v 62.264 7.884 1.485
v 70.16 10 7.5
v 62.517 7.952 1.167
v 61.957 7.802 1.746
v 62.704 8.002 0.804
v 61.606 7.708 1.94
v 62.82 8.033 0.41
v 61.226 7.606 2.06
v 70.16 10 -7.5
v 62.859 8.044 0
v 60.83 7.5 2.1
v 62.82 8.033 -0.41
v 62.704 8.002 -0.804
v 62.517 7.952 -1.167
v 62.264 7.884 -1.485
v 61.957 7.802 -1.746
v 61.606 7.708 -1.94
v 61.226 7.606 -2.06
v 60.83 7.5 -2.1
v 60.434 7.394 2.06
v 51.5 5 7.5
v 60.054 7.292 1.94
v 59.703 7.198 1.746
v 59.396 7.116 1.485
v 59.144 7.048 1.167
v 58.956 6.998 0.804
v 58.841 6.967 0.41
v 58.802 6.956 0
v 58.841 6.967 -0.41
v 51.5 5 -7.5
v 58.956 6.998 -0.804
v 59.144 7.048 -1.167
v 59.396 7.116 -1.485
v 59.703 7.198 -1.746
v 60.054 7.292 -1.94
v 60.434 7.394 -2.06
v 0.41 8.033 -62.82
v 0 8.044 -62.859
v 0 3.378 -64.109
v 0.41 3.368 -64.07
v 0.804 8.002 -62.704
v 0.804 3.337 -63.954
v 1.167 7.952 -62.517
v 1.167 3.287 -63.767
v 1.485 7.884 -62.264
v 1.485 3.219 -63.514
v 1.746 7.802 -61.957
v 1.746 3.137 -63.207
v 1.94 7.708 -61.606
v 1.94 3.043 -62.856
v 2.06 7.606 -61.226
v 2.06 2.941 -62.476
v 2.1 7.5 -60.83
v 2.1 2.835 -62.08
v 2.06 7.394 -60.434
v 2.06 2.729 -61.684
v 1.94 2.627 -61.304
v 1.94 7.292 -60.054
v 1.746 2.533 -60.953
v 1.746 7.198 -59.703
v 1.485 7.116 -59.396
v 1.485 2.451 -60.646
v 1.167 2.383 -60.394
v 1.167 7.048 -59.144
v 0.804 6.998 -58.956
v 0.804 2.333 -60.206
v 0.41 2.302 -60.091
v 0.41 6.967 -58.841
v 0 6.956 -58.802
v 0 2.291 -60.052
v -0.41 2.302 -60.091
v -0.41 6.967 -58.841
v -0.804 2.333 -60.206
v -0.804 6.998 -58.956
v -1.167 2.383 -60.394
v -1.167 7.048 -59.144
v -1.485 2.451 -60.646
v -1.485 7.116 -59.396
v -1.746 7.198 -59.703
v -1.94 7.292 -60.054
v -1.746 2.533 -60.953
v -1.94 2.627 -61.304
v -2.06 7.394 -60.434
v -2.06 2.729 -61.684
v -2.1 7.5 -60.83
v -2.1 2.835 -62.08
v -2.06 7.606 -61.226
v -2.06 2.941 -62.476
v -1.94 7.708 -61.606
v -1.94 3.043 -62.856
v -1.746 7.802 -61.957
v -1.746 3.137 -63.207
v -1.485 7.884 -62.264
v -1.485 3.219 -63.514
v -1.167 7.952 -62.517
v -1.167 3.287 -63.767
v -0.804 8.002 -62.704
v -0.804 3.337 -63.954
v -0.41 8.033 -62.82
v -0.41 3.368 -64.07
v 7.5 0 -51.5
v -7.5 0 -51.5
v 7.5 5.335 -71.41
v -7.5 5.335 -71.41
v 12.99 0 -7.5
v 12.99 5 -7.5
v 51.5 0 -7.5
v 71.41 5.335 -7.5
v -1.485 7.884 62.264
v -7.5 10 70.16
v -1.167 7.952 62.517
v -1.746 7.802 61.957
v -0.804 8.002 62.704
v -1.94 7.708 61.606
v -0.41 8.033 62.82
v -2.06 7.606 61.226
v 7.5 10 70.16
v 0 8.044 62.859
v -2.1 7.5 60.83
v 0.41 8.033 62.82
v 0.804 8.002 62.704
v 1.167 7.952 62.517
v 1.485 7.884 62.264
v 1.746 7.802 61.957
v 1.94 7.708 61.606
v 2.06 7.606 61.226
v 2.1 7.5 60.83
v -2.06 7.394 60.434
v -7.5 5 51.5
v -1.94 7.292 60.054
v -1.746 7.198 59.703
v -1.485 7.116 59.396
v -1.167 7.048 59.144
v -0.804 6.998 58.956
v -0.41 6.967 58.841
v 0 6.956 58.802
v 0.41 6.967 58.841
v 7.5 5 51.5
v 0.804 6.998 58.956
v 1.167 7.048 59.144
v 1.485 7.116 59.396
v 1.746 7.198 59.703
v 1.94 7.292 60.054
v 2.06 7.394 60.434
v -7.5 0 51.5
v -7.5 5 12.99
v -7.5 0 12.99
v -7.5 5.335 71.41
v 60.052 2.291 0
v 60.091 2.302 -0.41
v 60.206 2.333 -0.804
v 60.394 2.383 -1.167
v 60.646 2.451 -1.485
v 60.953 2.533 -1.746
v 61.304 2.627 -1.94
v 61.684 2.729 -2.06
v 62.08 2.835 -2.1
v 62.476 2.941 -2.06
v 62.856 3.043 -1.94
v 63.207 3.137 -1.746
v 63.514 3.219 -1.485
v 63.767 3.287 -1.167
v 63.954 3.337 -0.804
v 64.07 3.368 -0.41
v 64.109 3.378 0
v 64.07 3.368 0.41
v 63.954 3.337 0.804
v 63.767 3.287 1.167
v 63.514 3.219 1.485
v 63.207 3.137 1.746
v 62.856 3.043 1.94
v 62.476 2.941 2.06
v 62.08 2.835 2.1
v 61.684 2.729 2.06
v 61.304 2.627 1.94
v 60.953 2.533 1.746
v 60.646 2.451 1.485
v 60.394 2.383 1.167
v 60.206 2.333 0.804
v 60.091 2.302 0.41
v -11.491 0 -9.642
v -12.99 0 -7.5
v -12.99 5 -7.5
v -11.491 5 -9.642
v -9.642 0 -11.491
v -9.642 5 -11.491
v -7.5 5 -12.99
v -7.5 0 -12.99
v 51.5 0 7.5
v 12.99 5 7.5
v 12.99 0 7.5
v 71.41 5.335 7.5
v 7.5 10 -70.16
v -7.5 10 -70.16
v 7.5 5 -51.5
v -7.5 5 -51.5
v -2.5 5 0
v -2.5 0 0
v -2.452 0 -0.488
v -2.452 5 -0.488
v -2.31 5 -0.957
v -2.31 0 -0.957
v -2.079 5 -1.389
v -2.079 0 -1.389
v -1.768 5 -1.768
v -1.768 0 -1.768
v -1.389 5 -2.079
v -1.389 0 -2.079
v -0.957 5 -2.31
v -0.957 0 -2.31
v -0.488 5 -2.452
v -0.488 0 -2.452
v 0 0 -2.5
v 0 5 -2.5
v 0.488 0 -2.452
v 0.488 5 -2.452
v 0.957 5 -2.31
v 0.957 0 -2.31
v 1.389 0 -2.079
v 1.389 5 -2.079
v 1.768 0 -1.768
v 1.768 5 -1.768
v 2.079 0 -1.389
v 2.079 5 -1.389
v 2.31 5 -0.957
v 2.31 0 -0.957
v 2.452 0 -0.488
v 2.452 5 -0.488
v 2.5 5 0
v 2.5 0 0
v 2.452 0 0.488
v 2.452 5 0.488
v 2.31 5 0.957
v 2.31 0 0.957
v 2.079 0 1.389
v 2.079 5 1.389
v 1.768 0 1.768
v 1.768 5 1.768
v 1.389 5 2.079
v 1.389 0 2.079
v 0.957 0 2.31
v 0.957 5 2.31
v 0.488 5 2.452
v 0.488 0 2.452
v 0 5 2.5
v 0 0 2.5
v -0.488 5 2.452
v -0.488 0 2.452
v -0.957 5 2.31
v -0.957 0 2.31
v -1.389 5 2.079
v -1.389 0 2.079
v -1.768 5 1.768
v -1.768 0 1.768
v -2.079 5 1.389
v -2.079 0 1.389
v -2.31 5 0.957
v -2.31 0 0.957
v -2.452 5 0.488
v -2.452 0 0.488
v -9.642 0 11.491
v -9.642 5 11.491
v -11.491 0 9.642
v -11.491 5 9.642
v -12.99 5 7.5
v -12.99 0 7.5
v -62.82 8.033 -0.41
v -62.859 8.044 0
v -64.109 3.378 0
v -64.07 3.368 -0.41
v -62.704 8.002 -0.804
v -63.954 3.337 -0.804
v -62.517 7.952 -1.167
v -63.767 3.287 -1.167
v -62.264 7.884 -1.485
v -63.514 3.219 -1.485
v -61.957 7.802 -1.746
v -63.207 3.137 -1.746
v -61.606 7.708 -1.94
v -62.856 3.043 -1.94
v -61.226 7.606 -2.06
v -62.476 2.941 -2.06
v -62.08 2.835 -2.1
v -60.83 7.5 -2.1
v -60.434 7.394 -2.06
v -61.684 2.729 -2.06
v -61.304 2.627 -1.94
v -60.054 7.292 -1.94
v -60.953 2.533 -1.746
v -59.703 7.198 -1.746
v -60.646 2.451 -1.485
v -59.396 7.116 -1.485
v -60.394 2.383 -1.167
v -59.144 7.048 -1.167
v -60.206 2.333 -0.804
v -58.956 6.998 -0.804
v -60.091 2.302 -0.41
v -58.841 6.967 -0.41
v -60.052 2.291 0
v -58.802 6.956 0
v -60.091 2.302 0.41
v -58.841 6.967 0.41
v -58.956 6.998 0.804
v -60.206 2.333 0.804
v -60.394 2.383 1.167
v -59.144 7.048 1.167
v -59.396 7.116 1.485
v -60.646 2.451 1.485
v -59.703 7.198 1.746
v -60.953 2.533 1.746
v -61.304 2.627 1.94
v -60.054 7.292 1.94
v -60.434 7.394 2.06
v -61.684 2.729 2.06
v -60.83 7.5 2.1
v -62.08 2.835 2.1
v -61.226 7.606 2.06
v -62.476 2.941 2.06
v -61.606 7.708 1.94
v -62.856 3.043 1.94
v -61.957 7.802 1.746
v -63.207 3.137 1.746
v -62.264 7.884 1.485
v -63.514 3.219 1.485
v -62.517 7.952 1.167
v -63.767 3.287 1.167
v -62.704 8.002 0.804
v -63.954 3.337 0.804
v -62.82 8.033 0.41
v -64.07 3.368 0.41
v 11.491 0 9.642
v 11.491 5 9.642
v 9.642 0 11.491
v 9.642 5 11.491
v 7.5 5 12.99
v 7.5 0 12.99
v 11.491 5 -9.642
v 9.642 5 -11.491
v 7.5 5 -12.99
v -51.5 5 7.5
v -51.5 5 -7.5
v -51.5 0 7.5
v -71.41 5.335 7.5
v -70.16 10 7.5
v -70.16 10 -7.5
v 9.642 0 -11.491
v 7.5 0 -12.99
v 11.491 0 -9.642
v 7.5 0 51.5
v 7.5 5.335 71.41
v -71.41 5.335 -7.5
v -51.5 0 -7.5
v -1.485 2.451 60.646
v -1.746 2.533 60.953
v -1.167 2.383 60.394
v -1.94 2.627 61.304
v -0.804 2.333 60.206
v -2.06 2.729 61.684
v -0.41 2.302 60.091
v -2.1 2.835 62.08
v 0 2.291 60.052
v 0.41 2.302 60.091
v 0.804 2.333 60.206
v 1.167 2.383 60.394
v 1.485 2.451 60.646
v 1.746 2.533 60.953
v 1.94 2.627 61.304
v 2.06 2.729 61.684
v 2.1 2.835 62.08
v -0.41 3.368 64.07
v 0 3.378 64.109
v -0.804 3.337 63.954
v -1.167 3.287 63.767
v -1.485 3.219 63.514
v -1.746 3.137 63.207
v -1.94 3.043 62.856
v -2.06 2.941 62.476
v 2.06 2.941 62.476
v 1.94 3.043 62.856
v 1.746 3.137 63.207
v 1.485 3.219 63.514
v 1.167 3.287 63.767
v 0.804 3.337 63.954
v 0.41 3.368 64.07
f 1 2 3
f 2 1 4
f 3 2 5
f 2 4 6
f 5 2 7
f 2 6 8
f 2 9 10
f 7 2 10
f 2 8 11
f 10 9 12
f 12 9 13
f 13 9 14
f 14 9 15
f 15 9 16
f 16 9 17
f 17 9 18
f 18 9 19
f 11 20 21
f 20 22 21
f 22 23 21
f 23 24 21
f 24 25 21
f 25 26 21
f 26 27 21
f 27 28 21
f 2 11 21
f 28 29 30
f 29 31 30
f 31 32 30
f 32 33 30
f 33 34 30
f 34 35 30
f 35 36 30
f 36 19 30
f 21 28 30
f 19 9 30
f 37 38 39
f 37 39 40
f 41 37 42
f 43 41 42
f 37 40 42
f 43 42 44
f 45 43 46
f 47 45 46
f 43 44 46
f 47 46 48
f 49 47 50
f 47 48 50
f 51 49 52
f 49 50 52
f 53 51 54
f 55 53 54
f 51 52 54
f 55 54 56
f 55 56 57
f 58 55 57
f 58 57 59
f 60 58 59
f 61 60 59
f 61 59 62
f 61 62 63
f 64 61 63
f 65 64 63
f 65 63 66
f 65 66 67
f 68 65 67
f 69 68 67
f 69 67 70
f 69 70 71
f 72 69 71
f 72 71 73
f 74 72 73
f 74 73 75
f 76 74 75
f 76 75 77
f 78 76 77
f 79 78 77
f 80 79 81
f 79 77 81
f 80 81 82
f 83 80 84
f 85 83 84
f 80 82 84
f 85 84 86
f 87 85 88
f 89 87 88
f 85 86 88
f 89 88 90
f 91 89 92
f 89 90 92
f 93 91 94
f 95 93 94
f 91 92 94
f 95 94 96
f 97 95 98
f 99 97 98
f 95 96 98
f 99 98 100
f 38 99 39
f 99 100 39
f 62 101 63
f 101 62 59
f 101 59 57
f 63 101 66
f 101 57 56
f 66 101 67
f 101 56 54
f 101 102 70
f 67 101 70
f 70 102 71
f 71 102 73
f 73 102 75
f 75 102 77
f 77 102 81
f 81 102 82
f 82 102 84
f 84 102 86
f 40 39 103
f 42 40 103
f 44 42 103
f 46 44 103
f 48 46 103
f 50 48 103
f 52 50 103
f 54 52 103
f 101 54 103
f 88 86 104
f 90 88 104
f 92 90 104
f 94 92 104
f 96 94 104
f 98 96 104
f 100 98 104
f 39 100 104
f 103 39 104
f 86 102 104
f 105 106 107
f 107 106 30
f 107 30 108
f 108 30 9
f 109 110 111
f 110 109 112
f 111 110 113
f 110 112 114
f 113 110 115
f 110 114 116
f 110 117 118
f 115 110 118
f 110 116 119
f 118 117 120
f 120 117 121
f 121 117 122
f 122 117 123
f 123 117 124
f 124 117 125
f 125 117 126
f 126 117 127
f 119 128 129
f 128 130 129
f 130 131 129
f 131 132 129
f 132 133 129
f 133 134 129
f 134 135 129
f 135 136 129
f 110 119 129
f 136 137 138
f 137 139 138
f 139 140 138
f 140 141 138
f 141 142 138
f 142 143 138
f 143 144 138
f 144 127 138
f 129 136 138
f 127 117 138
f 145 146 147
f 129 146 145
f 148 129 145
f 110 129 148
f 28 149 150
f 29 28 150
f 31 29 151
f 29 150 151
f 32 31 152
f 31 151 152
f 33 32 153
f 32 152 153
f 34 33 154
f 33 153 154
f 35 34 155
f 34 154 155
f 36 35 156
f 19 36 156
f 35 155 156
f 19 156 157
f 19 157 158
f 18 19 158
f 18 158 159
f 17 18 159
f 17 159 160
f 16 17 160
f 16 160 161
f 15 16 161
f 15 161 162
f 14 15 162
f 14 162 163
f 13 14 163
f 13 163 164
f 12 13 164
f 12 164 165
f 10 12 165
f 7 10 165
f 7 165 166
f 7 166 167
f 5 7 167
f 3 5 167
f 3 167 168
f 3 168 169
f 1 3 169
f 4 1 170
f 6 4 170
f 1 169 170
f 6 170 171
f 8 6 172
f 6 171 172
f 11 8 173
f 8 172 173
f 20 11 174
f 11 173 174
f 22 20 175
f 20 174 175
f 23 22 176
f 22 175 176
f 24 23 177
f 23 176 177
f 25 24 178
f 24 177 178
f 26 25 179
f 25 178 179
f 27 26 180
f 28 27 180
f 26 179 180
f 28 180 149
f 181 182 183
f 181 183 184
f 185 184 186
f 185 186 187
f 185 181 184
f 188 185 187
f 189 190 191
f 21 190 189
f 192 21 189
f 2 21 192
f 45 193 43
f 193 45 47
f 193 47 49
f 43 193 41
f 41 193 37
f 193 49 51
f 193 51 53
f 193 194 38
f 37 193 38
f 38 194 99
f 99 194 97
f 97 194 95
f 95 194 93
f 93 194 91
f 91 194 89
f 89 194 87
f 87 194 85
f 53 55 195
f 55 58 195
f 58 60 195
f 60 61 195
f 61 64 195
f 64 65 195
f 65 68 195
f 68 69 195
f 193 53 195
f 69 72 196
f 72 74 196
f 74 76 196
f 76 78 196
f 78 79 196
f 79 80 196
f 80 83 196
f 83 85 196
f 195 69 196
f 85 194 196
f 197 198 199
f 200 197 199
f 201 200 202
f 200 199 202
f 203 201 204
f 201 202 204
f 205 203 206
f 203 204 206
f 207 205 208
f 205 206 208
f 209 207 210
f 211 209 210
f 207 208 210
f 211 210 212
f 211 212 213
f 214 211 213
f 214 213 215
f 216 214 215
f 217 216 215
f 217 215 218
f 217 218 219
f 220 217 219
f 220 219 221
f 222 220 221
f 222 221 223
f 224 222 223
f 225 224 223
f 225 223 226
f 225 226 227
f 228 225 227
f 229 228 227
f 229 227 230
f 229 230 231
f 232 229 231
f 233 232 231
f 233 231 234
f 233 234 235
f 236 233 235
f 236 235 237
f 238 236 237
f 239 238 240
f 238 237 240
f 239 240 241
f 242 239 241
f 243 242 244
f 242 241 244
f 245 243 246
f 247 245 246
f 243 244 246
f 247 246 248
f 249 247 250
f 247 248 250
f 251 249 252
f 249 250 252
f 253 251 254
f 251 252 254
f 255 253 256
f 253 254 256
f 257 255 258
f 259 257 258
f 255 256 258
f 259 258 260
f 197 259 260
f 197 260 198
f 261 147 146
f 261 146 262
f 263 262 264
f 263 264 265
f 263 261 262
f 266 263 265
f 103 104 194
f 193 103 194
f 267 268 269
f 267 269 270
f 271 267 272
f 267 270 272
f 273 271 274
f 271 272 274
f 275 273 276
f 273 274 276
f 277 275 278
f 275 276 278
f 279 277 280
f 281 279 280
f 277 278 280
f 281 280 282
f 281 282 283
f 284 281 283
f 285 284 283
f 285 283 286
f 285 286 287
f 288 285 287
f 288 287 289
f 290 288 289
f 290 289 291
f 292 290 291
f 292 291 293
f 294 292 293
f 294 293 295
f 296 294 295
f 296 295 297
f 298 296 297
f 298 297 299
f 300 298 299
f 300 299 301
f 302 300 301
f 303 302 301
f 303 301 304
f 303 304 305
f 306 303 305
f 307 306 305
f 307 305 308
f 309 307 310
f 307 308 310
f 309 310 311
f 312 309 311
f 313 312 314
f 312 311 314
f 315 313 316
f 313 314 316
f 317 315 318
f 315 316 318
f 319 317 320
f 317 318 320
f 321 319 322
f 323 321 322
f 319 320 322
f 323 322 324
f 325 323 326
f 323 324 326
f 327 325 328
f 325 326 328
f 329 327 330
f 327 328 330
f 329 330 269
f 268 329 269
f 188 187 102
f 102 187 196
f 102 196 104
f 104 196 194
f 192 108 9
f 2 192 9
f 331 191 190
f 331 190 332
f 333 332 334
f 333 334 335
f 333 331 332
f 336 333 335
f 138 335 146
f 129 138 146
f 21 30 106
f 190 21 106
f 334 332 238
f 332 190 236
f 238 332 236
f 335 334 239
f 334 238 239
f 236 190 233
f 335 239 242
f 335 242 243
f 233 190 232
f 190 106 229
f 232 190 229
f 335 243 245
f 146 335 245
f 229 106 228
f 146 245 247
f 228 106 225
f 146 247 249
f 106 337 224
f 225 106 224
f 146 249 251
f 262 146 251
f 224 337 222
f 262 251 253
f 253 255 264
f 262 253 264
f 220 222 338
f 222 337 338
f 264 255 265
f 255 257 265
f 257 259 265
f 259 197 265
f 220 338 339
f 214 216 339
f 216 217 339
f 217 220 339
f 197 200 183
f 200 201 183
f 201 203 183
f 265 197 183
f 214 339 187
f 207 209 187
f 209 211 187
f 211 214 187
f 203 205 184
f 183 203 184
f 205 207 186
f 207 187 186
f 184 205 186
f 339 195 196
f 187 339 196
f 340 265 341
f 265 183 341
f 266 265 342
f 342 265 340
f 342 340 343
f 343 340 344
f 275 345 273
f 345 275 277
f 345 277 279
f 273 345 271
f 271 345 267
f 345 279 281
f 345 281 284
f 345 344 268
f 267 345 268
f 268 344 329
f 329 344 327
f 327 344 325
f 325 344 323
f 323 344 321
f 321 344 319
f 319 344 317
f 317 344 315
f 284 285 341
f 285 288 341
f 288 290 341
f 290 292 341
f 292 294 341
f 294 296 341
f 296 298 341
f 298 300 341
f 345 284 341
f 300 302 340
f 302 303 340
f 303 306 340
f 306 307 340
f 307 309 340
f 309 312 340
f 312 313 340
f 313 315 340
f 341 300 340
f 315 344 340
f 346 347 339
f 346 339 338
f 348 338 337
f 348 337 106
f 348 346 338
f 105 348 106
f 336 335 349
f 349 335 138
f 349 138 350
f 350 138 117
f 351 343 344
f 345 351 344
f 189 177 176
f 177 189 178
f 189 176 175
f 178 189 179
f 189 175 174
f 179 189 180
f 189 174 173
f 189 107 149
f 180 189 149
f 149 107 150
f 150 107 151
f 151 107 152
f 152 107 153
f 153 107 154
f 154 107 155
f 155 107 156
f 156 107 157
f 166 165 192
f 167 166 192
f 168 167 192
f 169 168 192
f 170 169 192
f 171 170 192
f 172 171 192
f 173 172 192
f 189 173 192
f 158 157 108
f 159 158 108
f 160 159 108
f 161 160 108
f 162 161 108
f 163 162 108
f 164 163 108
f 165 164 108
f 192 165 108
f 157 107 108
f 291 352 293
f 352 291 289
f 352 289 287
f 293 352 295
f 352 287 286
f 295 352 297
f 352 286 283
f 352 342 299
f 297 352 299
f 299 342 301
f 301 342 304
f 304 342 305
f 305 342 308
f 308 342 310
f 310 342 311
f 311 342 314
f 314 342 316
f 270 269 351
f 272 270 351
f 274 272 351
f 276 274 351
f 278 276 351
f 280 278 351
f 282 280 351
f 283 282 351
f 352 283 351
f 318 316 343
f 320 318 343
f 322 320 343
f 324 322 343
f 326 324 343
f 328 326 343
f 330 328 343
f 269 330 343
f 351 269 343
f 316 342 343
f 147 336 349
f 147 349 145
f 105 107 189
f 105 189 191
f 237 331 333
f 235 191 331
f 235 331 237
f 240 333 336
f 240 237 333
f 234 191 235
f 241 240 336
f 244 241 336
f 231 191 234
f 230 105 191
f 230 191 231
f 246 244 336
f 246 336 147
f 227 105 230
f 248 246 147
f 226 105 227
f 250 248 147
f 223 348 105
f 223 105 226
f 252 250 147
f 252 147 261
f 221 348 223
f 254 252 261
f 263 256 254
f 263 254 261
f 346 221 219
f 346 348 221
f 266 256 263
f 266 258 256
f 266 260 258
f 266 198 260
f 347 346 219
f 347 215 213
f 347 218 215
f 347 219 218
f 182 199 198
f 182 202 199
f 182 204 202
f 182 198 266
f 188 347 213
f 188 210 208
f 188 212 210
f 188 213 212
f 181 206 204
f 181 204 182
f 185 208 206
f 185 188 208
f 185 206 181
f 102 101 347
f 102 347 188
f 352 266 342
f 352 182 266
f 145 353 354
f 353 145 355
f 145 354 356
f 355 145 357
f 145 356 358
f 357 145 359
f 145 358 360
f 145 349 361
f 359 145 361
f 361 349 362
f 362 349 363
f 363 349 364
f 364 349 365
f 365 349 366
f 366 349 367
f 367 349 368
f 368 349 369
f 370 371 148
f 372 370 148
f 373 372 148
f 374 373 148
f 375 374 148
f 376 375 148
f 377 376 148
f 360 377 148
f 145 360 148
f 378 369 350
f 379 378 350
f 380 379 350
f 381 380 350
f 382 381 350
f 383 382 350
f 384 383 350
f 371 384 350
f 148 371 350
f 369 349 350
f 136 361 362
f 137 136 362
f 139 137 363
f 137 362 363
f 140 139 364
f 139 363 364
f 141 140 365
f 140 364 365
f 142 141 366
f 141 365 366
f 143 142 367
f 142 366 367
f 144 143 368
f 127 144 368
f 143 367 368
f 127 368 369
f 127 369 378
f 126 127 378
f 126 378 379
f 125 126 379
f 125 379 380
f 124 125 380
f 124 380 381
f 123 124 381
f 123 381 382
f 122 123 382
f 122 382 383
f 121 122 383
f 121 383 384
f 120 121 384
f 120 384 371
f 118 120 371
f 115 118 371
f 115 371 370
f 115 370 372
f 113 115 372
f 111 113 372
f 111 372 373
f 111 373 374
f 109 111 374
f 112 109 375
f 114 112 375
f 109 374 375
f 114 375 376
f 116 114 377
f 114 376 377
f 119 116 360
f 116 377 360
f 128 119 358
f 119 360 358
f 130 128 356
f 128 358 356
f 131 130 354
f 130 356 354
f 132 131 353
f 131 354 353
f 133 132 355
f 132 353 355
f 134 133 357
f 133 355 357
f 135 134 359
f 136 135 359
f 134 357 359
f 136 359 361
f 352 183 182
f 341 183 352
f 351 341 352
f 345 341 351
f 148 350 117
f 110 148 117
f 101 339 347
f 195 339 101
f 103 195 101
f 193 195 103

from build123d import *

# Parameters (mm, degrees)
EXTRUDE_1_DEPTH             = 5
EXTRUDE_6_DEPTH             = 15
EXTRUDE_7_DEPTH             = 15
EXTRUDE_8_DEPTH             = 15
EXTRUDE_9_DEPTH             = 15
HOLE_WIZARD_M61_D           = 5
HOLE_WIZARD_M51_D           = 4.2
HOLE_WIZARD_M51_ON_FACE_2_D = 4.2
HOLE_WIZARD_M51_ON_FACE_3_D = 4.2
HOLE_WIZARD_M51_ON_FACE_4_D = 4.2


with BuildPart() as part:
    # Эскиз1 → Бобышка-Вытянуть1 (new body)
    with BuildSketch(Plane(origin=(0, 0, 0), x_dir=(1, 0, 0), z_dir=(0, 1, 0))):
        with BuildLine():
            Line((-7.5, 51.5), (7.5, 51.5))
            Line((7.5, 51.5), (7.5, 12.990381057))
            ThreePointArc((7.5, 12.990381057), (10.606601718, 10.606601718), (12.990381057, 7.5))
            Line((12.990381057, 7.5), (51.5, 7.5))
            Line((51.5, 7.5), (51.5, -7.5))
            Line((51.5, -7.5), (12.990381057, -7.5))
            ThreePointArc((12.990381057, -7.5), (10.606601718, -10.606601718), (7.5, -12.990381057))
            Line((7.5, -12.990381057), (7.5, -51.5))
            Line((7.5, -51.5), (-7.5, -51.5))
            Line((-7.5, -51.5), (-7.5, -12.990381057))
            ThreePointArc((-7.5, -12.990381057), (-10.606601718, -10.606601718), (-12.990381057, -7.5))
            Line((-12.990381057, -7.5), (-51.5, -7.5))
            Line((-51.5, -7.5), (-51.5, 7.5))
            Line((-51.5, 7.5), (-12.990381057, 7.5))
            ThreePointArc((-12.990381057, 7.5), (-10.606601718, 10.606601718), (-7.5, 12.990381057))
            Line((-7.5, 12.990381057), (-7.5, 51.5))
        make_face()
    extrude(amount=EXTRUDE_1_DEPTH)

    # Эскиз2 → Бобышка-Вытянуть6 (add)
    with BuildSketch(Plane(origin=(7.5, 0, 0), x_dir=(0, 0, -1), z_dir=(1, 0, 0))):
        Polygon((-51.5, 0), (-71.410254038, 5.334936491), (-70.160254038, 10), (-51.5, 5), align=None)
    extrude(amount=-EXTRUDE_6_DEPTH)

    # Эскиз3 → Бобышка-Вытянуть7 (add)
    with BuildSketch(Plane(origin=(0, 0, -7.5), x_dir=(-1, 0, 0), z_dir=(0, 0, -1))):
        Polygon((-51.5, 0), (-71.410254038, 5.334936491), (-70.160254038, 10), (-51.5, 5), align=None)
    extrude(amount=-EXTRUDE_7_DEPTH)

    # Эскиз4 → Бобышка-Вытянуть8 (add)
    with BuildSketch(Plane.ZY.offset(7.5)):
        Polygon((-51.5, 0), (-71.410254038, 5.334936491), (-70.160254038, 10), (-51.5, 5), align=None)
    extrude(amount=-EXTRUDE_8_DEPTH)

    # Эскиз5 → Бобышка-Вытянуть9 (add)
    with BuildSketch(Plane.XY.offset(7.5)):
        Polygon((-51.5, 0), (-71.410254038, 5.334936491), (-70.160254038, 10), (-51.5, 5), align=None)
    extrude(amount=-EXTRUDE_9_DEPTH)

    # Отверстие обработанное метчиком M61 (through all)
    with Locations(Plane(origin=(0, 5, 0), x_dir=(1, 0, 0), z_dir=(0, 1, 0))):
        with Locations((0, 0)):
            Hole(HOLE_WIZARD_M61_D / 2)

    # Отверстие обработанное метчиком M51 (through all)
    with Locations(Plane(origin=(-60.830127019, 7.5, 0), x_dir=(0.965925826289, -0.258819045103, 0), z_dir=(0.258819045103, 0.965925826289, 0))):
        with Locations((0, 0)):
            Hole(HOLE_WIZARD_M51_D / 2)

    # Отверстие обработанное метчиком M51 on face 2 (through all)
    with Locations(Plane(origin=(0, 7.5, 60.830127019), x_dir=(0, 0.258818959594, 0.965925849201), z_dir=(0, 0.965925849201, -0.258818959594))):
        with Locations((0, 0)):
            Hole(HOLE_WIZARD_M51_ON_FACE_2_D / 2)

    # Отверстие обработанное метчиком M51 on face 3 (through all)
    with Locations(Plane(origin=(60.830127019, 7.5, 0), x_dir=(0.965925849201, 0.258818959594, 0), z_dir=(-0.258818959594, 0.965925849201, 0))):
        with Locations((0, 0)):
            Hole(HOLE_WIZARD_M51_ON_FACE_3_D / 2)

    # Отверстие обработанное метчиком M51 on face 4 (through all)
    with Locations(Plane(origin=(0, 7.5, -60.830127019), x_dir=(0, -0.258818959594, 0.965925849201), z_dir=(0, 0.965925849201, 0.258818959594))):
        with Locations((0, 0)):
            Hole(HOLE_WIZARD_M51_ON_FACE_4_D / 2)


solid = part.part
